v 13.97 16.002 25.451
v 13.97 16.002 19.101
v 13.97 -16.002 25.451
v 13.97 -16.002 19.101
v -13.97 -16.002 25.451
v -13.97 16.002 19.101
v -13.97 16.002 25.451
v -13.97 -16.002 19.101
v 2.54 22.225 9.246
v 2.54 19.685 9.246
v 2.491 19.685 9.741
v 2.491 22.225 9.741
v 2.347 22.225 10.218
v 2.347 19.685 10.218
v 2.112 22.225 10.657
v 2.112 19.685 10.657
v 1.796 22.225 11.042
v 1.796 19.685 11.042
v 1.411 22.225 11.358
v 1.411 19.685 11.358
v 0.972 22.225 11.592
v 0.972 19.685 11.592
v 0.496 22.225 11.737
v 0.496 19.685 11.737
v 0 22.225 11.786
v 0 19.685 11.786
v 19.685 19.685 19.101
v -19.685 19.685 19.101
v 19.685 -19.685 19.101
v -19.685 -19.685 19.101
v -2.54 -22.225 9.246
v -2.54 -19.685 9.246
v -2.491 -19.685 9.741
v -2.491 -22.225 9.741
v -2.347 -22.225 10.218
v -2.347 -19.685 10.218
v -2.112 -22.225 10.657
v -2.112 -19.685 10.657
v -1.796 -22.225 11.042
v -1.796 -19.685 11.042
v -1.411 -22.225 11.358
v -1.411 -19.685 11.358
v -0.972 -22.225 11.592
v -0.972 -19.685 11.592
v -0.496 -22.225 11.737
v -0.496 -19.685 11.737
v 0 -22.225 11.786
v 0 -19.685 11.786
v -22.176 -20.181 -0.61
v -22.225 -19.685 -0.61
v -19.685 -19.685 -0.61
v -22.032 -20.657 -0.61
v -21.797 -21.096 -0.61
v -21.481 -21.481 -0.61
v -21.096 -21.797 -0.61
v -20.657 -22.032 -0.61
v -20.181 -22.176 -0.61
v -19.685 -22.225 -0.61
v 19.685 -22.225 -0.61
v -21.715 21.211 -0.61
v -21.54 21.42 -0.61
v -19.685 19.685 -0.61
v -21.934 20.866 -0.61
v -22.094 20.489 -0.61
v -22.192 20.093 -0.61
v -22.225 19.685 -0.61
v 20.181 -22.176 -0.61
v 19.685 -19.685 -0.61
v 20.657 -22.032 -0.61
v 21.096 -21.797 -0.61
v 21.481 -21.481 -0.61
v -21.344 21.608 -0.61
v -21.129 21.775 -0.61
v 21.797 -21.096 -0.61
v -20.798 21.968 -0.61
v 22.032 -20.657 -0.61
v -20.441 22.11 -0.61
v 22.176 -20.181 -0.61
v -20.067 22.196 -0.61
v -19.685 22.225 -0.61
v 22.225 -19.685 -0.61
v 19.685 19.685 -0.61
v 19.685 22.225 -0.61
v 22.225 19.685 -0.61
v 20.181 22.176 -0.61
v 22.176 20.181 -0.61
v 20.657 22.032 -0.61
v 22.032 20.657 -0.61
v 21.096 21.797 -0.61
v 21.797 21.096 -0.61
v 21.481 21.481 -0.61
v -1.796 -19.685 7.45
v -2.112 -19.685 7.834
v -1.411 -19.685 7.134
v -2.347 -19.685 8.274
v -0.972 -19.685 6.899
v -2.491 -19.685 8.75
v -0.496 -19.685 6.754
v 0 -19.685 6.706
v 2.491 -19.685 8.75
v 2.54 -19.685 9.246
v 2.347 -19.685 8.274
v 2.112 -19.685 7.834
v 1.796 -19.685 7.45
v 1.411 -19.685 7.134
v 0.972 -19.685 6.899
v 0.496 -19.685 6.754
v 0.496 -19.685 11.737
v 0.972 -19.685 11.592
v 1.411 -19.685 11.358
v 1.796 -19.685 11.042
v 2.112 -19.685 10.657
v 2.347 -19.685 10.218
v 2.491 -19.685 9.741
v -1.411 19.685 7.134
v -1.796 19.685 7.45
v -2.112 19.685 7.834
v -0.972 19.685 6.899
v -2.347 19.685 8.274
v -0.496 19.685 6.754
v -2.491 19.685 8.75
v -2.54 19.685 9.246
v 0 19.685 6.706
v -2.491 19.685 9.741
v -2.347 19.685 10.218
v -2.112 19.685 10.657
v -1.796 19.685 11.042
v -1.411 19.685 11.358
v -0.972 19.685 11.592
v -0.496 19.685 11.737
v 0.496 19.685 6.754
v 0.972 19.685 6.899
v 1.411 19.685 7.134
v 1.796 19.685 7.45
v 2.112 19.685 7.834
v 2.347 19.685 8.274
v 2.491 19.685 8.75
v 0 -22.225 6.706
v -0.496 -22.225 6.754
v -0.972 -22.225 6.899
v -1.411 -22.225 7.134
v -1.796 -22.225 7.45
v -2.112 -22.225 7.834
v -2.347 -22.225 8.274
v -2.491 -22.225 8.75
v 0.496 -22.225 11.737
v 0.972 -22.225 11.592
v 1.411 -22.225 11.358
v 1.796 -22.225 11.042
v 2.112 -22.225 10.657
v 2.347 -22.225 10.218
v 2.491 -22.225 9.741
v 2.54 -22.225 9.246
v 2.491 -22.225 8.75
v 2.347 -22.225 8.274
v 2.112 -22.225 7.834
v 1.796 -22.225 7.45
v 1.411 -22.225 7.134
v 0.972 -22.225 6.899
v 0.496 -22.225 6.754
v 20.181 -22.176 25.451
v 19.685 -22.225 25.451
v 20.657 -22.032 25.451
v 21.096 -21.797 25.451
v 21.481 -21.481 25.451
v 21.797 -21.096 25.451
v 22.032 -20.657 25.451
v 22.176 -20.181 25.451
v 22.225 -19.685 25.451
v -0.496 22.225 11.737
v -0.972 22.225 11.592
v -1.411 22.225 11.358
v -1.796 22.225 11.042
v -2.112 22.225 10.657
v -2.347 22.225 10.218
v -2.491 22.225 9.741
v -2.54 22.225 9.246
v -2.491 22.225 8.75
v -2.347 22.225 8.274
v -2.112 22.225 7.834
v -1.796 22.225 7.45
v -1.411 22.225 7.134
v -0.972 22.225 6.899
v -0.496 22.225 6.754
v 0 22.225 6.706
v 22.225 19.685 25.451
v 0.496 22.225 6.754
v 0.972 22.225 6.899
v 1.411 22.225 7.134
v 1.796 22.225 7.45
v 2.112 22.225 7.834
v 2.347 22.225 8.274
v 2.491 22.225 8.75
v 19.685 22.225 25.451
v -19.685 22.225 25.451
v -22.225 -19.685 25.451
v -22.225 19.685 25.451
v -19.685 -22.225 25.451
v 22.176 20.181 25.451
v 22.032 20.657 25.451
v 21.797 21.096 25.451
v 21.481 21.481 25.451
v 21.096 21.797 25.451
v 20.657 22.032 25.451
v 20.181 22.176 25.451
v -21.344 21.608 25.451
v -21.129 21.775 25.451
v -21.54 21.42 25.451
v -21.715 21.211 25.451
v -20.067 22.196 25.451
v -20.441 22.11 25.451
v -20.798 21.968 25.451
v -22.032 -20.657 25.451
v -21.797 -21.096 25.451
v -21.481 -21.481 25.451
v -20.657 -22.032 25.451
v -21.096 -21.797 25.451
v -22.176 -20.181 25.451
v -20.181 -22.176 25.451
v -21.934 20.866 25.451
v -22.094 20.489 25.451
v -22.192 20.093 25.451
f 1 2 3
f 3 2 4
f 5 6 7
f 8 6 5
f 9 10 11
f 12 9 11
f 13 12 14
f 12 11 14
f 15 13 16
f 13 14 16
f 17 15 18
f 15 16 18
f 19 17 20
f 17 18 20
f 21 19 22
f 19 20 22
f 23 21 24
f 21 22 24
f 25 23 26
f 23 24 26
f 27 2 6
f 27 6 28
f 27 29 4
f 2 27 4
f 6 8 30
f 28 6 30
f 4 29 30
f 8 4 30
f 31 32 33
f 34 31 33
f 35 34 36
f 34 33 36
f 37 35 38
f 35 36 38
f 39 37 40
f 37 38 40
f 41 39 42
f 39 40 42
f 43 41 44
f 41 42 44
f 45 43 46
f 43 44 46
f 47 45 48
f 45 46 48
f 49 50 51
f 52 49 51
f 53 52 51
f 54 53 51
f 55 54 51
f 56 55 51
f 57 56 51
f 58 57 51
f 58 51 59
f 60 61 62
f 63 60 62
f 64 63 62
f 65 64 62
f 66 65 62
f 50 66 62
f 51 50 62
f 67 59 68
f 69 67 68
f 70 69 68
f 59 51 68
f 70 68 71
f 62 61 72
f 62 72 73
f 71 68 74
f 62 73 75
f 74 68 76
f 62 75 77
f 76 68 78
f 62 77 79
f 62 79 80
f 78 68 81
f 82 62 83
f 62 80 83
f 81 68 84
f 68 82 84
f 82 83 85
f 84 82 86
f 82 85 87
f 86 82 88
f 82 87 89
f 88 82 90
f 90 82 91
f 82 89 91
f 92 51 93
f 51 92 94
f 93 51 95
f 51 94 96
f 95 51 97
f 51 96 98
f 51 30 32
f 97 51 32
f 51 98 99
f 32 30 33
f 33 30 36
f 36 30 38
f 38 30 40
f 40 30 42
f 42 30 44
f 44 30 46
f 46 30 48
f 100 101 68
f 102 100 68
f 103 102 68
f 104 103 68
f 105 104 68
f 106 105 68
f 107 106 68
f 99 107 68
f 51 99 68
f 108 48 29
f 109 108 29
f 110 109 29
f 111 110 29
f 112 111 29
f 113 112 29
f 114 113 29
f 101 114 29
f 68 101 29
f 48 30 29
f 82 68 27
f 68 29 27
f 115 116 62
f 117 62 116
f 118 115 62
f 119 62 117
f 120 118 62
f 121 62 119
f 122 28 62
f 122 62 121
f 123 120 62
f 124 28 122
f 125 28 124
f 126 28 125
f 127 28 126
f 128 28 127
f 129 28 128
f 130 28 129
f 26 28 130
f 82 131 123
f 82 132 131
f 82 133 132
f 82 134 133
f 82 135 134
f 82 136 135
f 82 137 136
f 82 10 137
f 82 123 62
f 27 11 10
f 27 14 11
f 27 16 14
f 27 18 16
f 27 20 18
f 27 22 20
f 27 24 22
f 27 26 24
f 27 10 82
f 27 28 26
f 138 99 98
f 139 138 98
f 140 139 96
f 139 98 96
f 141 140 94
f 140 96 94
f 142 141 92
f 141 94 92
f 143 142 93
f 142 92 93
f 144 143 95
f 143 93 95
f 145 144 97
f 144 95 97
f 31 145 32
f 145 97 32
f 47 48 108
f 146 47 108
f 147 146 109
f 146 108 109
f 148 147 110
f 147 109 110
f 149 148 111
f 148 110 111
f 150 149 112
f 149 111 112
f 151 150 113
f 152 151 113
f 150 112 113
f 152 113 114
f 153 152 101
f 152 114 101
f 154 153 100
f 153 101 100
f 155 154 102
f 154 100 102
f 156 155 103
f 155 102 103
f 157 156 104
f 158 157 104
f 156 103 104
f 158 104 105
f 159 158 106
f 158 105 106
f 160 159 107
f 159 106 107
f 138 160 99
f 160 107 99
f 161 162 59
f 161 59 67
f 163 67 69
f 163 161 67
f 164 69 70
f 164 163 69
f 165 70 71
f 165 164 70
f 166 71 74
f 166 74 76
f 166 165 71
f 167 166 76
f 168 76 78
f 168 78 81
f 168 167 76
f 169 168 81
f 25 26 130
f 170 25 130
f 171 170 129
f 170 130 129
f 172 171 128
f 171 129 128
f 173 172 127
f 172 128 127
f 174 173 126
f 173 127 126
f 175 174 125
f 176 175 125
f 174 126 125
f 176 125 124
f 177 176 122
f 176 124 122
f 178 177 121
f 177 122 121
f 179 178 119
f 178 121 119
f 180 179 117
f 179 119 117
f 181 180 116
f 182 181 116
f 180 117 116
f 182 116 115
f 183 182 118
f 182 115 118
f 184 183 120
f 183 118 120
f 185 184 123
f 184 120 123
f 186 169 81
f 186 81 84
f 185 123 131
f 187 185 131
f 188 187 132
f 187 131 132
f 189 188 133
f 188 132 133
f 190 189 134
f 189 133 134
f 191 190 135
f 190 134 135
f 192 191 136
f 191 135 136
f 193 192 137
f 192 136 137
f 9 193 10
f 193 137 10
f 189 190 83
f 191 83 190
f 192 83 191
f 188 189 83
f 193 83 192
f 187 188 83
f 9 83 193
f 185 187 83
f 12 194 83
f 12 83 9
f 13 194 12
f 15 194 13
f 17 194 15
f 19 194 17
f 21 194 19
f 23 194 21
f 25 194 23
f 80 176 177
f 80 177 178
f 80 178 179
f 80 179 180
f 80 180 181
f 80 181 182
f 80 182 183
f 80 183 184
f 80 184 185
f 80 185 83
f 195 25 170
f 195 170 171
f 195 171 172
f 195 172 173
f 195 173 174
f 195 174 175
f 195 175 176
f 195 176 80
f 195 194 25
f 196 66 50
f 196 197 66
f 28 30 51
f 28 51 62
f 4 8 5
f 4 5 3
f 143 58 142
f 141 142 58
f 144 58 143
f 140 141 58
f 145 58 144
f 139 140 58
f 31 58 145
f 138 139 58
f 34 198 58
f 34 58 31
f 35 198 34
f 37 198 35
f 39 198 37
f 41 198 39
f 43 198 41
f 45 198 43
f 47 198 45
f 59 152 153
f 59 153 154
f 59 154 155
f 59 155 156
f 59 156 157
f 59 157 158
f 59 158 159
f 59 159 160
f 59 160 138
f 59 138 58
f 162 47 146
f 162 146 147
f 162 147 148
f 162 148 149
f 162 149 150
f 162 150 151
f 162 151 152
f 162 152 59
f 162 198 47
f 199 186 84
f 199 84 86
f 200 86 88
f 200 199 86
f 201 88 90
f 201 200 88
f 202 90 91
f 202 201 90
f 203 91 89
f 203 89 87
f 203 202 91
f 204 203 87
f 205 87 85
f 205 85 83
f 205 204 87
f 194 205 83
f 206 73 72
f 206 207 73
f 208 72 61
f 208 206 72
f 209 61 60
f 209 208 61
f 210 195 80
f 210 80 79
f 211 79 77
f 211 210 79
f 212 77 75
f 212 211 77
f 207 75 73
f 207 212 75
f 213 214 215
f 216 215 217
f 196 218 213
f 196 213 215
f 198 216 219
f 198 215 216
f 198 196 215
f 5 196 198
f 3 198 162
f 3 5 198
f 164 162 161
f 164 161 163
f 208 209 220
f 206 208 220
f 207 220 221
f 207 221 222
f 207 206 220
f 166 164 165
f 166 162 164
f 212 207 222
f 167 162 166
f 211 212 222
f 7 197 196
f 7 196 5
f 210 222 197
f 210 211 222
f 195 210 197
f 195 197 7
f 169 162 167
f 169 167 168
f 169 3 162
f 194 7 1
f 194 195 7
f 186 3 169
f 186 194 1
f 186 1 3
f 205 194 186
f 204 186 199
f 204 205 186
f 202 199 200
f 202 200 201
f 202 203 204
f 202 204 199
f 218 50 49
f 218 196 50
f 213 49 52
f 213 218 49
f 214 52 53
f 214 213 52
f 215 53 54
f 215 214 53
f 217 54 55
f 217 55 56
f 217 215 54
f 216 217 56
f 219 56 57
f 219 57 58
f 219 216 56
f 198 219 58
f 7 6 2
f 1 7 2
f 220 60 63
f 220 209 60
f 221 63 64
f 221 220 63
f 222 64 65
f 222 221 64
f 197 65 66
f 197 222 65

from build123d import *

# Parameters (mm, degrees)
F0_W      = 39.37
F0_H      = 39.37
F1_DEPTH  = 26.2128
F2_W      = 39.37
F2_H      = 7.112
F3_DEPTH  = 40.291659534
F4_W      = 27.94
F4_H      = 32.004
F5_DEPTH  = 25.4
F6_DEPTH  = 0.762
F7_DEPTH  = 0.6096
F9_DEPTH  = 7.62
F11_DEPTH = 7.62


with BuildPart() as f1:
    # F0 (on Top) → F1 (new body)
    with BuildSketch(Plane.XY):
        with BuildLine():
            Line((-19.685, -22.225), (19.685, -22.225))
            ThreePointArc((19.685, -22.225), (21.4810512242, -21.4810512242), (22.225, -19.685))
            Line((22.225, -19.685), (22.225, 19.685))
            ThreePointArc((22.225, 19.685), (21.4810512242, 21.4810512242), (19.685, 22.225))
            Line((19.685, 22.225), (-19.685, 22.225))
            ThreePointArc((-19.685, 22.225), (-20.4412358464, 22.1098107853), (-21.1288809737, 21.7746908225))
            ThreePointArc((-21.1288809737, 21.7746908225), (-21.4448596213, 21.5165278085), (-21.7154231521, 21.211100201))
            ThreePointArc((-21.7154231521, 21.211100201), (-22.0942400053, 20.4894641675), (-22.225, 19.685))
            Line((-22.225, 19.685), (-22.225, -19.685))
            ThreePointArc((-22.225, -19.685), (-21.4810512242, -21.4810512242), (-19.685, -22.225))
        make_face()
        Rectangle(F0_W, F0_H, mode=Mode.SUBTRACT)
    extrude(amount=F1_DEPTH)

    # F2 (on face) → F3 (join)
    with BuildSketch(Plane(origin=(0, -19.685, 0), x_dir=(-1, 0, 0), z_dir=(0, 1, 0))):
        with Locations((0, 22.6568)):
            Rectangle(F2_W, F2_H)
    extrude(amount=F3_DEPTH)

    # F4 (on face) → F5 (cut)
    with BuildSketch(Plane(origin=(0, 0, 19.1008), x_dir=(1, 0, 0), z_dir=(0, 0, -1))):
        Rectangle(F4_W, F4_H)
    extrude(amount=-F5_DEPTH, mode=Mode.SUBTRACT)

    # F6 (cut): a face of the model
    f6_faces = [f1.faces().sort_by_distance(p)[0] for p in [
        (0, -21.5963820715, 26.2128),
    ]]
    extrude(f6_faces, amount=-F6_DEPTH, mode=Mode.SUBTRACT)

    # F7 (add): a face of the model
    f7_faces = [f1.faces().sort_by_distance(p)[0] for p in [
        (0, -21.5963820715, 0),
    ]]
    extrude(f7_faces, amount=F7_DEPTH)

    # F8 (on face) → F9 (cut)
    with BuildSketch(Plane(origin=(0, -19.685, 0), x_dir=(-1, 0, 0), z_dir=(0, 1, 0))):
        with BuildLine():
            ThreePointArc((0, 11.7856), (-2.54, 9.2456), (0, 6.7056))
            Line((0, 6.7056), (0, 11.7856))
        make_face()
        with BuildLine():
            Line((0, 11.7856), (0, 6.7056))
            ThreePointArc((0, 6.7056), (1.7960512242, 7.4495487758), (2.54, 9.2456))
            ThreePointArc((2.54, 9.2456), (1.7960512242, 11.0416512242), (0, 11.7856))
        make_face()
    extrude(amount=-F9_DEPTH, mode=Mode.SUBTRACT)

    # F10 (on face) → F11 (cut)
    with BuildSketch(Plane.XZ.offset(-19.685)):
        with BuildLine():
            ThreePointArc((0, 11.7856), (-2.54, 9.2456), (0, 6.7056))
            Line((0, 6.7056), (0, 11.7856))
        make_face()
        with BuildLine():
            Line((0, 11.7856), (0, 6.7056))
            ThreePointArc((0, 6.7056), (1.7960512242, 7.4495487758), (2.54, 9.2456))
            ThreePointArc((2.54, 9.2456), (1.7960512242, 11.0416512242), (0, 11.7856))
        make_face()
    extrude(amount=-F11_DEPTH, mode=Mode.SUBTRACT)


solid = f1.part
